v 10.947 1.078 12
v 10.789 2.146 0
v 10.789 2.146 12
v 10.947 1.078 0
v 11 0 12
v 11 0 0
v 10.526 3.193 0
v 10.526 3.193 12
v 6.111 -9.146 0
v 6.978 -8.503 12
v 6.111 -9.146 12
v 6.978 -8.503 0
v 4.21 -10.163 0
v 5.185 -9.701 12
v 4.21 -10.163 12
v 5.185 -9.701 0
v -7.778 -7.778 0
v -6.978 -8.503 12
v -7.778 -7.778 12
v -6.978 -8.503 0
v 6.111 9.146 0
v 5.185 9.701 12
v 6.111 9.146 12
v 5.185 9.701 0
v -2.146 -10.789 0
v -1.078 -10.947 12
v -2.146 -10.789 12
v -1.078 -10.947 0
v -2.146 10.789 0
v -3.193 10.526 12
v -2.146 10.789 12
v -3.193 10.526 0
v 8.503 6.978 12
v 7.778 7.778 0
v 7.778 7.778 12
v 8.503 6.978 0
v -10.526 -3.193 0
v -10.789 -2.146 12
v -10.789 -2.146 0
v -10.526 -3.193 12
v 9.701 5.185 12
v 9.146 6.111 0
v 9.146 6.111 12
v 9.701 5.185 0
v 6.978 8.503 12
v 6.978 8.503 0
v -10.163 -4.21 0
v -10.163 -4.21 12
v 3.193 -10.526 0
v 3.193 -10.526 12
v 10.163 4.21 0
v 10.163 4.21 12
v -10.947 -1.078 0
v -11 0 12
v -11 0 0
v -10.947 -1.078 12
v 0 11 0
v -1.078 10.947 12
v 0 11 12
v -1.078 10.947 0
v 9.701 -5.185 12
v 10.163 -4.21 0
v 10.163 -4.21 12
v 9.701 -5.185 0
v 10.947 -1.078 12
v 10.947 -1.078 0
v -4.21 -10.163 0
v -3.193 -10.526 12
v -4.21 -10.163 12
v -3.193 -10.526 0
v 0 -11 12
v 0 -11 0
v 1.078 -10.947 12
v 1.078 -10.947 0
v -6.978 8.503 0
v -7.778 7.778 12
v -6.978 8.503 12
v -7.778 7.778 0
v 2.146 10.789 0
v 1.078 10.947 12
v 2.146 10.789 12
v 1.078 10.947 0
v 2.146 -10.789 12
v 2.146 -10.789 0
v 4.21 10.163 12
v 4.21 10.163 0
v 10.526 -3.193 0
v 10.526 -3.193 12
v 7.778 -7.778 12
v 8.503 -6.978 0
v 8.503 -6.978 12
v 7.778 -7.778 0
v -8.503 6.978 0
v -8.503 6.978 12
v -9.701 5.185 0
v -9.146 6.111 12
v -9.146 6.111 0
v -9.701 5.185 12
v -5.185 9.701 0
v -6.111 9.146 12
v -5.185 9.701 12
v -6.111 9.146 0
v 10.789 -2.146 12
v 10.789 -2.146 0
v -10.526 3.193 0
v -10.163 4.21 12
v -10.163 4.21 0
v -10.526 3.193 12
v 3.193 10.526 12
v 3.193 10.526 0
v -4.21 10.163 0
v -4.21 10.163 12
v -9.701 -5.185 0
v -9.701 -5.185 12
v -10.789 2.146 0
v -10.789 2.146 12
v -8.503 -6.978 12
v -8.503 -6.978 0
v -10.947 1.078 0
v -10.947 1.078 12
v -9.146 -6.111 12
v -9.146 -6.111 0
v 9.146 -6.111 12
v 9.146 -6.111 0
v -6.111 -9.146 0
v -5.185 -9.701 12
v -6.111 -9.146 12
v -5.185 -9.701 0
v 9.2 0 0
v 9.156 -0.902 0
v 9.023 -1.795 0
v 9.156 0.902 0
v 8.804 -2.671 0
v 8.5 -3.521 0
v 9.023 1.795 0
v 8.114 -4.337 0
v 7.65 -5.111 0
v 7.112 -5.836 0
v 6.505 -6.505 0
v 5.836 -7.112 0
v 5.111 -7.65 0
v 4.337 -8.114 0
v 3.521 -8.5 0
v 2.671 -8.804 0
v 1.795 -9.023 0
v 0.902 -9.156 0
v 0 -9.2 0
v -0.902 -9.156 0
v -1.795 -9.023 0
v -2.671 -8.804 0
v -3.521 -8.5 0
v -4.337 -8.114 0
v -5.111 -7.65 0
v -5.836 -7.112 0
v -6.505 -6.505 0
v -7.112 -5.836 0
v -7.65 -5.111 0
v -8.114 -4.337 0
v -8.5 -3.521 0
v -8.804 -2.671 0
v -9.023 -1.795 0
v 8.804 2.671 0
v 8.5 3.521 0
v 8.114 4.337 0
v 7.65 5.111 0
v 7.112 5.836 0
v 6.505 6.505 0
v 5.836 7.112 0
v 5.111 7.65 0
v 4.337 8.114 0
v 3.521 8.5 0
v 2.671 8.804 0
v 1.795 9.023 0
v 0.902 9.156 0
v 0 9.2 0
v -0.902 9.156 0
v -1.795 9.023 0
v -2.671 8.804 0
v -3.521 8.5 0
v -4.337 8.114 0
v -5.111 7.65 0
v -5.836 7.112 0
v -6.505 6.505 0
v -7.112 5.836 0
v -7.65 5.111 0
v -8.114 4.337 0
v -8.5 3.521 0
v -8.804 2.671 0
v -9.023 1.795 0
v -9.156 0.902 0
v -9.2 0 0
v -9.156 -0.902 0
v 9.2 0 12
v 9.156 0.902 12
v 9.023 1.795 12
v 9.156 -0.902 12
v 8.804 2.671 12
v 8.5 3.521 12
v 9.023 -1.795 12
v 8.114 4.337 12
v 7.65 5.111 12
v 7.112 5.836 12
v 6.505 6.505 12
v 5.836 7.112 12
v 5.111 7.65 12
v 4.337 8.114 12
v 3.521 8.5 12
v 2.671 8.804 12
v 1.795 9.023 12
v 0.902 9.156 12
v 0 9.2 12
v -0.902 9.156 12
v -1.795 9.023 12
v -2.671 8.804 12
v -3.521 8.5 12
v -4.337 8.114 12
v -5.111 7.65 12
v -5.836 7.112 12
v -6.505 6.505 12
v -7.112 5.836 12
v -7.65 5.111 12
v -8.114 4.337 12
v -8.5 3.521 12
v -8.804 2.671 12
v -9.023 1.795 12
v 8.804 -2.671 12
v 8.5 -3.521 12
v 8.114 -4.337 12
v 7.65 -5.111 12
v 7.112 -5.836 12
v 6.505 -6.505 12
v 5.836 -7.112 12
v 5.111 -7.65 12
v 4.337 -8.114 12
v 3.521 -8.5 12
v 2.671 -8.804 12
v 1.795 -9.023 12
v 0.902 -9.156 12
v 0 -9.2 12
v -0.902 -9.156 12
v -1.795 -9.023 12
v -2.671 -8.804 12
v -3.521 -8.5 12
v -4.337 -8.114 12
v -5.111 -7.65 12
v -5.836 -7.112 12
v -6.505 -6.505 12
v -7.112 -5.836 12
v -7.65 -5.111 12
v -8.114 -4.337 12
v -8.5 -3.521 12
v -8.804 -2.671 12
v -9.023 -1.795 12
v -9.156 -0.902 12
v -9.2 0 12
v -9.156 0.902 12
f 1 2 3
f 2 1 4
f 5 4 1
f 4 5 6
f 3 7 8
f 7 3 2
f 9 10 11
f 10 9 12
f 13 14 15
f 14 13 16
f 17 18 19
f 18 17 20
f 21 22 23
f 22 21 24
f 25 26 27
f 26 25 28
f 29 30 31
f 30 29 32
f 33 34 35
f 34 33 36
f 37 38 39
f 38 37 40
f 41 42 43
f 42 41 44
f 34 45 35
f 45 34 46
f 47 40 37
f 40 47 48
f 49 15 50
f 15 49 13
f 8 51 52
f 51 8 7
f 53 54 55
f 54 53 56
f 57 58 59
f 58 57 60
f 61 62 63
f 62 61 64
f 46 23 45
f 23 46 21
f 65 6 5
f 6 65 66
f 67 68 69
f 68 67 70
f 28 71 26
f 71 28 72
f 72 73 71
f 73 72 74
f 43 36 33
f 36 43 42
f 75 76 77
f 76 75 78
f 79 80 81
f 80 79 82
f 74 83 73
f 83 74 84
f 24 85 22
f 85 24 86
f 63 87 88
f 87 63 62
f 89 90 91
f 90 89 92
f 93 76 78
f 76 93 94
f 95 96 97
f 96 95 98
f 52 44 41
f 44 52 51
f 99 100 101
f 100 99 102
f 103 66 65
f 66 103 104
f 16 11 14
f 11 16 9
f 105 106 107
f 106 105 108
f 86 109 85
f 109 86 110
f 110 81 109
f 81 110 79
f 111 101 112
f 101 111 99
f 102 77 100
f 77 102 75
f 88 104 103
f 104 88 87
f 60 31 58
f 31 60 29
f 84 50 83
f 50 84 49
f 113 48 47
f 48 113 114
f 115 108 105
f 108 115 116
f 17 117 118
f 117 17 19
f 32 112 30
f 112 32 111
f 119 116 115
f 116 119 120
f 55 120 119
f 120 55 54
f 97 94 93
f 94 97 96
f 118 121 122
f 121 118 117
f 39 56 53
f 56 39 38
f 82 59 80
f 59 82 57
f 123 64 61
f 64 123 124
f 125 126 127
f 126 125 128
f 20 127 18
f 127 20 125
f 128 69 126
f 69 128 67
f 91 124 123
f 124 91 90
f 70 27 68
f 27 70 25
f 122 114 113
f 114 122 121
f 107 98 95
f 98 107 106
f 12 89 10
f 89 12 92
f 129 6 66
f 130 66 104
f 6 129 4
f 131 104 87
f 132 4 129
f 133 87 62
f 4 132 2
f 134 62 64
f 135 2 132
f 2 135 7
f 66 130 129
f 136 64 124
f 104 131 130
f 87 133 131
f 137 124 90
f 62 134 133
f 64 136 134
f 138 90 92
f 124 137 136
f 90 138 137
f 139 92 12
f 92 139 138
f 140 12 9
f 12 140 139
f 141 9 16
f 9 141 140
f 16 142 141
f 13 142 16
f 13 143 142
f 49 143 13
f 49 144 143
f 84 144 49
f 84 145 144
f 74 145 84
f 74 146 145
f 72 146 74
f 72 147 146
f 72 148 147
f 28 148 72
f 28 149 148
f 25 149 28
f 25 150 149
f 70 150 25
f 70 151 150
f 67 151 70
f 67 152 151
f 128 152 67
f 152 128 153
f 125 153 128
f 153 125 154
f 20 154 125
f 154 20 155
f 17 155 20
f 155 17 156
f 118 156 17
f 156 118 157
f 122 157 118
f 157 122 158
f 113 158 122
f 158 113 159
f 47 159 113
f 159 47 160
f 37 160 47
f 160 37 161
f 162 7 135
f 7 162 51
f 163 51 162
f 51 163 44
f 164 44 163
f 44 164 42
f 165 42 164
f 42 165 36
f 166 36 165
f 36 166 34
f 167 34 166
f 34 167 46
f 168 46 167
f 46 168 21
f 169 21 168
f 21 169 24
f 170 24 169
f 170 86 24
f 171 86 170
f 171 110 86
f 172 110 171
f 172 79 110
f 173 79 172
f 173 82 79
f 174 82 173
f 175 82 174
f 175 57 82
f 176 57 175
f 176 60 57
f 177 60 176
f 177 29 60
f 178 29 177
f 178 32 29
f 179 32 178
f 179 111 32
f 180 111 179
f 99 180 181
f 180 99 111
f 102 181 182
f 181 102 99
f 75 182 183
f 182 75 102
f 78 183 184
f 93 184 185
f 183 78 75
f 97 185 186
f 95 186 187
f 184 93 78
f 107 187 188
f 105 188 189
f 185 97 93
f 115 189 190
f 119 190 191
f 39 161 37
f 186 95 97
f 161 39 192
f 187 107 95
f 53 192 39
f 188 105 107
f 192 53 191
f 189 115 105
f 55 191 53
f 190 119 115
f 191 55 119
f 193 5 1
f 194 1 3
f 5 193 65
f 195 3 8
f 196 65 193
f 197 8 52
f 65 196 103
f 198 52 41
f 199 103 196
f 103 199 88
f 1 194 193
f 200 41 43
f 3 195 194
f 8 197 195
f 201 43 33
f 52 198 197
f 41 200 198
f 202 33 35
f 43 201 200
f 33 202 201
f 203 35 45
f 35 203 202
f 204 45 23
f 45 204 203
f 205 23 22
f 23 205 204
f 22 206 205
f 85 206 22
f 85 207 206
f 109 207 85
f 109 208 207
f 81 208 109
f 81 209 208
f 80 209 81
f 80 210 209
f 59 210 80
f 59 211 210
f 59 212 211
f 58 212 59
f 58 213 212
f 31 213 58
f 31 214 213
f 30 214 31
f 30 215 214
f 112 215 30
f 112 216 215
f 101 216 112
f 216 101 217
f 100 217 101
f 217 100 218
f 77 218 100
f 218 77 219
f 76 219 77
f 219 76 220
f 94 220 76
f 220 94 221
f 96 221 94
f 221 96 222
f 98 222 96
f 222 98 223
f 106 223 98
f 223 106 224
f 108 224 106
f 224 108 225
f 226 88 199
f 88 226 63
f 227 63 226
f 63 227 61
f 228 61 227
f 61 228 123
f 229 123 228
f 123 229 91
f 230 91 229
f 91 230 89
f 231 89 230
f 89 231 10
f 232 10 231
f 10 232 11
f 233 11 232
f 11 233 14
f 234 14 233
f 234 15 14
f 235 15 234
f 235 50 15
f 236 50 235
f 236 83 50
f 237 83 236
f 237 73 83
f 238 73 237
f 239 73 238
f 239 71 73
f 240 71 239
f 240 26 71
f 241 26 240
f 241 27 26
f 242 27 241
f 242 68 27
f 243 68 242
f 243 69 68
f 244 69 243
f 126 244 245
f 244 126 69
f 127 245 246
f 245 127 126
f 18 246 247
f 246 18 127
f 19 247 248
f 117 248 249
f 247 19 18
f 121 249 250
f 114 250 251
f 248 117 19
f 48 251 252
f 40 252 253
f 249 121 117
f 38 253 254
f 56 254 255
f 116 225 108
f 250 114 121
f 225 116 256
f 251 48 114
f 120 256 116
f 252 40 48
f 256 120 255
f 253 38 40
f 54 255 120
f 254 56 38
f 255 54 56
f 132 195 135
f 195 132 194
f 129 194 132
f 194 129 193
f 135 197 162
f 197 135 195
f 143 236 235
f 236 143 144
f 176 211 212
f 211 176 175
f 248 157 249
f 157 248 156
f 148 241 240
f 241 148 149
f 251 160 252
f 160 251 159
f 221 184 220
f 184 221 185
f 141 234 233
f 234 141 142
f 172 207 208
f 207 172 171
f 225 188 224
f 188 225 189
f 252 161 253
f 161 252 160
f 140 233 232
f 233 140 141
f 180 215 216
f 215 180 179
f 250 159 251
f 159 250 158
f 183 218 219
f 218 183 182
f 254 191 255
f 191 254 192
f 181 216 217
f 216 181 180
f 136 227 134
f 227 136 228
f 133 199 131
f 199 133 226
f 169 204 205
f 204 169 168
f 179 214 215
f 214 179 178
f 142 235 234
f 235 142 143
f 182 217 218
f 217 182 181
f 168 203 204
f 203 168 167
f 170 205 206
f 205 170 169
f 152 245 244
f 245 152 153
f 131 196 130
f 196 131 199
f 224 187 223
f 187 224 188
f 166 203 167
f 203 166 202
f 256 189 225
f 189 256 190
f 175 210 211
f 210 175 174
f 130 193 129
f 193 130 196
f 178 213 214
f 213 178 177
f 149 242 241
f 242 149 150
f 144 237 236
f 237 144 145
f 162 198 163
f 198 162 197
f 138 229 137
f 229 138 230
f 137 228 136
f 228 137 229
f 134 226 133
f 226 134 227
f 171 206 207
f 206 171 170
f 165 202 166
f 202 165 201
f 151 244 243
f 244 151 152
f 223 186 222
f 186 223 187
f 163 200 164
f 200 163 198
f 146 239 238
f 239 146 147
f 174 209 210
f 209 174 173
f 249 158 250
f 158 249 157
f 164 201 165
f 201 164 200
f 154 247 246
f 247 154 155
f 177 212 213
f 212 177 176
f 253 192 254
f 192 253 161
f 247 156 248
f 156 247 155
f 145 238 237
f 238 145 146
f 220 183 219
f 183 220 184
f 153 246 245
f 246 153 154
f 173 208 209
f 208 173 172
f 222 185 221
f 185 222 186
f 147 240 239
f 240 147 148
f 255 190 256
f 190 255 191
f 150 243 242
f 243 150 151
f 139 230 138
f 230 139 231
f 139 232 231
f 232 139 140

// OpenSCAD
// file: ../fj.scad
// FreeJet FJ-1 - shared dimensions and helpers.
// Coordinates (mm): X = carriage travel (left -> right, 0 = inner face of the left plate)
//                   Y = paper travel (paper moves toward +Y, 0 = printhead nozzle line)
//                   Z = up (0 = paper surface on the platen)
// Every part file includes this, so changing a number here moves everything.

$fn = 64;
e = 0.01;
tol = 0.25;          // clearance for printed fits

// ---- frame ----------------------------------------------------------------
inner_w   = 360;     // distance between the side plates
plate_t   = 8;
rod_d     = 8;       // all rods: 8 mm x 400 mm smooth rod
rod_len   = 400;
plate_y0  = -112;    // side plate outline in Y
plate_y1  = 88;
plate_z0  = -70;     // bottom of the feet
plate_z1  = 70;

// ---- carriage rods ------------------------------------------------------------
rail_y    = -42;
rail_lo_z = 14;
rail_hi_z = 50;
belt_y    = -60;     // axis line of the X motor pulley and idler (both vertical)
belt_z    = 32;      // height of the belt centre
belt_r    = 20*2/PI/2;          // 20T GT2 pitch radius
belt_front_y = belt_y + belt_r; // strand clamped to the carriage
belt_back_y  = belt_y - belt_r; // return strand, passes behind the carriage

// ---- paper path -------------------------------------------------------------
tire_od   = 22;      // drive and pinch roller outside diameter
in_y      = -76;     // input nip (rollers before the printhead)
out_y     = 52;      // output nip (star wheels after the printhead)
shaft_z   = -tire_od/2;
pinch_z   = tire_od/2;
star_od   = 18;
star_z    = star_od/2;
platen_rod_y = [-40, 26];
platen_rod_z = -13;
platen_y0 = -62;     // platen top surface extent
platen_y1 = 84;
sensor_y  = -54;     // paper lever switch
paper_x0  = 70;      // paper left edge (fixed guide)
paper_w   = 220;     // widest sheet
sensor_x  = paper_x0 + 14;   // paper lever switch X
tire_x    = [paper_x0+20, paper_x0+75, paper_x0+145, paper_x0+200];  // roller positions

// ---- feed drive ---------------------------------------------------------------
pulley_teeth = 76;   // printed GT2 pulleys on both roller shafts
feed_motor_y = -12;
feed_motor_z = -44;  // 400 mm closed GT2 loop around 76T + 76T + 20T

// ---- printhead / cartridge (MEASURE YOUR HP45 AND ADJUST) -----------------------
cart_w    = 24.5;    // across the carriage travel (X)
cart_d    = 50;      // front-to-back (Y)
cart_h    = 62;
nz_back   = 19;      // nozzle line distance from the contact (back) face
head_gap  = 1.2;     // nozzle plate height above the paper
pad_z0    = 3;       // contact pad footprint origin above the cartridge bottom
carr_w    = 54;      // carriage width along X
park_x    = 33;      // carriage centre X when parked (capped)

// ---- service station ------------------------------------------------------------
home_x    = 30;      // carriage centre X where the home switch trips (firmware X = 0)
sled_engage = 9;     // sled travel when parked (cap pressed on the nozzles)
cap_x     = park_x + sled_engage;   // cap centre with the sled retracted
wiper_x   = 56;
spit_x    = 62;      // firmware spit_x_um = (spit_x - home_x) * 1000

// ---- hardware -----------------------------------------------------------------
lm8uu_d = 15; lm8uu_l = 24;
b608_d = 22; b608_w = 7;
m3 = 3.2; m3_head = 6; m3_nut = 6.4;   // across flats + tolerance
m25 = 2.7;
nema_hole = 31; nema_body = 42.3; nema_boss = 22.5;

module rod_hole(l=40, d=rod_d+tol) { cylinder(d=d, h=l, center=true); }
module m3_hole(l=40) { cylinder(d=m3, h=l, center=true); }
module m3_nut_trap(h=3) { cylinder(d=m3_nut/cos(30), h=h, $fn=6); }
module rounded_box(size, r=3) {
    hull() for (x=[r, size[0]-r], y=[r, size[1]-r]) translate([x, y, 0]) cylinder(r=r, h=size[2]);
}
module nema17_holes(l=20, slot=0) {
    for (x=[-1,1], y=[-1,1]) hull() for (s=[-slot/2, slot/2])
        translate([x*nema_hole/2, y*nema_hole/2 + s, 0]) cylinder(d=m3, h=l, center=true);
    hull() for (s=[-slot/2, slot/2]) translate([0, s, 0]) cylinder(d=nema_boss+1, h=l, center=true);
}

// ---- carriage details ------------------------------------------------------------
carr_z0   = head_gap + 2.5;   // carriage walls stop above the nozzle plate
carr_z1   = 64;
pcb_w     = 44;  pcb_h = 46;  pcb_t = 1.6;   // printhead board
pcb_back  = 5;                 // component height behind the board
cart_rest_z = 18;              // height (above cartridge bottom) of the side rest tabs; 0 = none
// main file
// TPU tire for roller_hub.scad (print 12, TPU 95A, 100 % infill). Stretch over the hub.
include <../fj.scad>
difference() {
    cylinder(d=tire_od, h=12);
    translate([0,0,-1]) cylinder(d=tire_od - 3 - 0.6, h=14);
}
